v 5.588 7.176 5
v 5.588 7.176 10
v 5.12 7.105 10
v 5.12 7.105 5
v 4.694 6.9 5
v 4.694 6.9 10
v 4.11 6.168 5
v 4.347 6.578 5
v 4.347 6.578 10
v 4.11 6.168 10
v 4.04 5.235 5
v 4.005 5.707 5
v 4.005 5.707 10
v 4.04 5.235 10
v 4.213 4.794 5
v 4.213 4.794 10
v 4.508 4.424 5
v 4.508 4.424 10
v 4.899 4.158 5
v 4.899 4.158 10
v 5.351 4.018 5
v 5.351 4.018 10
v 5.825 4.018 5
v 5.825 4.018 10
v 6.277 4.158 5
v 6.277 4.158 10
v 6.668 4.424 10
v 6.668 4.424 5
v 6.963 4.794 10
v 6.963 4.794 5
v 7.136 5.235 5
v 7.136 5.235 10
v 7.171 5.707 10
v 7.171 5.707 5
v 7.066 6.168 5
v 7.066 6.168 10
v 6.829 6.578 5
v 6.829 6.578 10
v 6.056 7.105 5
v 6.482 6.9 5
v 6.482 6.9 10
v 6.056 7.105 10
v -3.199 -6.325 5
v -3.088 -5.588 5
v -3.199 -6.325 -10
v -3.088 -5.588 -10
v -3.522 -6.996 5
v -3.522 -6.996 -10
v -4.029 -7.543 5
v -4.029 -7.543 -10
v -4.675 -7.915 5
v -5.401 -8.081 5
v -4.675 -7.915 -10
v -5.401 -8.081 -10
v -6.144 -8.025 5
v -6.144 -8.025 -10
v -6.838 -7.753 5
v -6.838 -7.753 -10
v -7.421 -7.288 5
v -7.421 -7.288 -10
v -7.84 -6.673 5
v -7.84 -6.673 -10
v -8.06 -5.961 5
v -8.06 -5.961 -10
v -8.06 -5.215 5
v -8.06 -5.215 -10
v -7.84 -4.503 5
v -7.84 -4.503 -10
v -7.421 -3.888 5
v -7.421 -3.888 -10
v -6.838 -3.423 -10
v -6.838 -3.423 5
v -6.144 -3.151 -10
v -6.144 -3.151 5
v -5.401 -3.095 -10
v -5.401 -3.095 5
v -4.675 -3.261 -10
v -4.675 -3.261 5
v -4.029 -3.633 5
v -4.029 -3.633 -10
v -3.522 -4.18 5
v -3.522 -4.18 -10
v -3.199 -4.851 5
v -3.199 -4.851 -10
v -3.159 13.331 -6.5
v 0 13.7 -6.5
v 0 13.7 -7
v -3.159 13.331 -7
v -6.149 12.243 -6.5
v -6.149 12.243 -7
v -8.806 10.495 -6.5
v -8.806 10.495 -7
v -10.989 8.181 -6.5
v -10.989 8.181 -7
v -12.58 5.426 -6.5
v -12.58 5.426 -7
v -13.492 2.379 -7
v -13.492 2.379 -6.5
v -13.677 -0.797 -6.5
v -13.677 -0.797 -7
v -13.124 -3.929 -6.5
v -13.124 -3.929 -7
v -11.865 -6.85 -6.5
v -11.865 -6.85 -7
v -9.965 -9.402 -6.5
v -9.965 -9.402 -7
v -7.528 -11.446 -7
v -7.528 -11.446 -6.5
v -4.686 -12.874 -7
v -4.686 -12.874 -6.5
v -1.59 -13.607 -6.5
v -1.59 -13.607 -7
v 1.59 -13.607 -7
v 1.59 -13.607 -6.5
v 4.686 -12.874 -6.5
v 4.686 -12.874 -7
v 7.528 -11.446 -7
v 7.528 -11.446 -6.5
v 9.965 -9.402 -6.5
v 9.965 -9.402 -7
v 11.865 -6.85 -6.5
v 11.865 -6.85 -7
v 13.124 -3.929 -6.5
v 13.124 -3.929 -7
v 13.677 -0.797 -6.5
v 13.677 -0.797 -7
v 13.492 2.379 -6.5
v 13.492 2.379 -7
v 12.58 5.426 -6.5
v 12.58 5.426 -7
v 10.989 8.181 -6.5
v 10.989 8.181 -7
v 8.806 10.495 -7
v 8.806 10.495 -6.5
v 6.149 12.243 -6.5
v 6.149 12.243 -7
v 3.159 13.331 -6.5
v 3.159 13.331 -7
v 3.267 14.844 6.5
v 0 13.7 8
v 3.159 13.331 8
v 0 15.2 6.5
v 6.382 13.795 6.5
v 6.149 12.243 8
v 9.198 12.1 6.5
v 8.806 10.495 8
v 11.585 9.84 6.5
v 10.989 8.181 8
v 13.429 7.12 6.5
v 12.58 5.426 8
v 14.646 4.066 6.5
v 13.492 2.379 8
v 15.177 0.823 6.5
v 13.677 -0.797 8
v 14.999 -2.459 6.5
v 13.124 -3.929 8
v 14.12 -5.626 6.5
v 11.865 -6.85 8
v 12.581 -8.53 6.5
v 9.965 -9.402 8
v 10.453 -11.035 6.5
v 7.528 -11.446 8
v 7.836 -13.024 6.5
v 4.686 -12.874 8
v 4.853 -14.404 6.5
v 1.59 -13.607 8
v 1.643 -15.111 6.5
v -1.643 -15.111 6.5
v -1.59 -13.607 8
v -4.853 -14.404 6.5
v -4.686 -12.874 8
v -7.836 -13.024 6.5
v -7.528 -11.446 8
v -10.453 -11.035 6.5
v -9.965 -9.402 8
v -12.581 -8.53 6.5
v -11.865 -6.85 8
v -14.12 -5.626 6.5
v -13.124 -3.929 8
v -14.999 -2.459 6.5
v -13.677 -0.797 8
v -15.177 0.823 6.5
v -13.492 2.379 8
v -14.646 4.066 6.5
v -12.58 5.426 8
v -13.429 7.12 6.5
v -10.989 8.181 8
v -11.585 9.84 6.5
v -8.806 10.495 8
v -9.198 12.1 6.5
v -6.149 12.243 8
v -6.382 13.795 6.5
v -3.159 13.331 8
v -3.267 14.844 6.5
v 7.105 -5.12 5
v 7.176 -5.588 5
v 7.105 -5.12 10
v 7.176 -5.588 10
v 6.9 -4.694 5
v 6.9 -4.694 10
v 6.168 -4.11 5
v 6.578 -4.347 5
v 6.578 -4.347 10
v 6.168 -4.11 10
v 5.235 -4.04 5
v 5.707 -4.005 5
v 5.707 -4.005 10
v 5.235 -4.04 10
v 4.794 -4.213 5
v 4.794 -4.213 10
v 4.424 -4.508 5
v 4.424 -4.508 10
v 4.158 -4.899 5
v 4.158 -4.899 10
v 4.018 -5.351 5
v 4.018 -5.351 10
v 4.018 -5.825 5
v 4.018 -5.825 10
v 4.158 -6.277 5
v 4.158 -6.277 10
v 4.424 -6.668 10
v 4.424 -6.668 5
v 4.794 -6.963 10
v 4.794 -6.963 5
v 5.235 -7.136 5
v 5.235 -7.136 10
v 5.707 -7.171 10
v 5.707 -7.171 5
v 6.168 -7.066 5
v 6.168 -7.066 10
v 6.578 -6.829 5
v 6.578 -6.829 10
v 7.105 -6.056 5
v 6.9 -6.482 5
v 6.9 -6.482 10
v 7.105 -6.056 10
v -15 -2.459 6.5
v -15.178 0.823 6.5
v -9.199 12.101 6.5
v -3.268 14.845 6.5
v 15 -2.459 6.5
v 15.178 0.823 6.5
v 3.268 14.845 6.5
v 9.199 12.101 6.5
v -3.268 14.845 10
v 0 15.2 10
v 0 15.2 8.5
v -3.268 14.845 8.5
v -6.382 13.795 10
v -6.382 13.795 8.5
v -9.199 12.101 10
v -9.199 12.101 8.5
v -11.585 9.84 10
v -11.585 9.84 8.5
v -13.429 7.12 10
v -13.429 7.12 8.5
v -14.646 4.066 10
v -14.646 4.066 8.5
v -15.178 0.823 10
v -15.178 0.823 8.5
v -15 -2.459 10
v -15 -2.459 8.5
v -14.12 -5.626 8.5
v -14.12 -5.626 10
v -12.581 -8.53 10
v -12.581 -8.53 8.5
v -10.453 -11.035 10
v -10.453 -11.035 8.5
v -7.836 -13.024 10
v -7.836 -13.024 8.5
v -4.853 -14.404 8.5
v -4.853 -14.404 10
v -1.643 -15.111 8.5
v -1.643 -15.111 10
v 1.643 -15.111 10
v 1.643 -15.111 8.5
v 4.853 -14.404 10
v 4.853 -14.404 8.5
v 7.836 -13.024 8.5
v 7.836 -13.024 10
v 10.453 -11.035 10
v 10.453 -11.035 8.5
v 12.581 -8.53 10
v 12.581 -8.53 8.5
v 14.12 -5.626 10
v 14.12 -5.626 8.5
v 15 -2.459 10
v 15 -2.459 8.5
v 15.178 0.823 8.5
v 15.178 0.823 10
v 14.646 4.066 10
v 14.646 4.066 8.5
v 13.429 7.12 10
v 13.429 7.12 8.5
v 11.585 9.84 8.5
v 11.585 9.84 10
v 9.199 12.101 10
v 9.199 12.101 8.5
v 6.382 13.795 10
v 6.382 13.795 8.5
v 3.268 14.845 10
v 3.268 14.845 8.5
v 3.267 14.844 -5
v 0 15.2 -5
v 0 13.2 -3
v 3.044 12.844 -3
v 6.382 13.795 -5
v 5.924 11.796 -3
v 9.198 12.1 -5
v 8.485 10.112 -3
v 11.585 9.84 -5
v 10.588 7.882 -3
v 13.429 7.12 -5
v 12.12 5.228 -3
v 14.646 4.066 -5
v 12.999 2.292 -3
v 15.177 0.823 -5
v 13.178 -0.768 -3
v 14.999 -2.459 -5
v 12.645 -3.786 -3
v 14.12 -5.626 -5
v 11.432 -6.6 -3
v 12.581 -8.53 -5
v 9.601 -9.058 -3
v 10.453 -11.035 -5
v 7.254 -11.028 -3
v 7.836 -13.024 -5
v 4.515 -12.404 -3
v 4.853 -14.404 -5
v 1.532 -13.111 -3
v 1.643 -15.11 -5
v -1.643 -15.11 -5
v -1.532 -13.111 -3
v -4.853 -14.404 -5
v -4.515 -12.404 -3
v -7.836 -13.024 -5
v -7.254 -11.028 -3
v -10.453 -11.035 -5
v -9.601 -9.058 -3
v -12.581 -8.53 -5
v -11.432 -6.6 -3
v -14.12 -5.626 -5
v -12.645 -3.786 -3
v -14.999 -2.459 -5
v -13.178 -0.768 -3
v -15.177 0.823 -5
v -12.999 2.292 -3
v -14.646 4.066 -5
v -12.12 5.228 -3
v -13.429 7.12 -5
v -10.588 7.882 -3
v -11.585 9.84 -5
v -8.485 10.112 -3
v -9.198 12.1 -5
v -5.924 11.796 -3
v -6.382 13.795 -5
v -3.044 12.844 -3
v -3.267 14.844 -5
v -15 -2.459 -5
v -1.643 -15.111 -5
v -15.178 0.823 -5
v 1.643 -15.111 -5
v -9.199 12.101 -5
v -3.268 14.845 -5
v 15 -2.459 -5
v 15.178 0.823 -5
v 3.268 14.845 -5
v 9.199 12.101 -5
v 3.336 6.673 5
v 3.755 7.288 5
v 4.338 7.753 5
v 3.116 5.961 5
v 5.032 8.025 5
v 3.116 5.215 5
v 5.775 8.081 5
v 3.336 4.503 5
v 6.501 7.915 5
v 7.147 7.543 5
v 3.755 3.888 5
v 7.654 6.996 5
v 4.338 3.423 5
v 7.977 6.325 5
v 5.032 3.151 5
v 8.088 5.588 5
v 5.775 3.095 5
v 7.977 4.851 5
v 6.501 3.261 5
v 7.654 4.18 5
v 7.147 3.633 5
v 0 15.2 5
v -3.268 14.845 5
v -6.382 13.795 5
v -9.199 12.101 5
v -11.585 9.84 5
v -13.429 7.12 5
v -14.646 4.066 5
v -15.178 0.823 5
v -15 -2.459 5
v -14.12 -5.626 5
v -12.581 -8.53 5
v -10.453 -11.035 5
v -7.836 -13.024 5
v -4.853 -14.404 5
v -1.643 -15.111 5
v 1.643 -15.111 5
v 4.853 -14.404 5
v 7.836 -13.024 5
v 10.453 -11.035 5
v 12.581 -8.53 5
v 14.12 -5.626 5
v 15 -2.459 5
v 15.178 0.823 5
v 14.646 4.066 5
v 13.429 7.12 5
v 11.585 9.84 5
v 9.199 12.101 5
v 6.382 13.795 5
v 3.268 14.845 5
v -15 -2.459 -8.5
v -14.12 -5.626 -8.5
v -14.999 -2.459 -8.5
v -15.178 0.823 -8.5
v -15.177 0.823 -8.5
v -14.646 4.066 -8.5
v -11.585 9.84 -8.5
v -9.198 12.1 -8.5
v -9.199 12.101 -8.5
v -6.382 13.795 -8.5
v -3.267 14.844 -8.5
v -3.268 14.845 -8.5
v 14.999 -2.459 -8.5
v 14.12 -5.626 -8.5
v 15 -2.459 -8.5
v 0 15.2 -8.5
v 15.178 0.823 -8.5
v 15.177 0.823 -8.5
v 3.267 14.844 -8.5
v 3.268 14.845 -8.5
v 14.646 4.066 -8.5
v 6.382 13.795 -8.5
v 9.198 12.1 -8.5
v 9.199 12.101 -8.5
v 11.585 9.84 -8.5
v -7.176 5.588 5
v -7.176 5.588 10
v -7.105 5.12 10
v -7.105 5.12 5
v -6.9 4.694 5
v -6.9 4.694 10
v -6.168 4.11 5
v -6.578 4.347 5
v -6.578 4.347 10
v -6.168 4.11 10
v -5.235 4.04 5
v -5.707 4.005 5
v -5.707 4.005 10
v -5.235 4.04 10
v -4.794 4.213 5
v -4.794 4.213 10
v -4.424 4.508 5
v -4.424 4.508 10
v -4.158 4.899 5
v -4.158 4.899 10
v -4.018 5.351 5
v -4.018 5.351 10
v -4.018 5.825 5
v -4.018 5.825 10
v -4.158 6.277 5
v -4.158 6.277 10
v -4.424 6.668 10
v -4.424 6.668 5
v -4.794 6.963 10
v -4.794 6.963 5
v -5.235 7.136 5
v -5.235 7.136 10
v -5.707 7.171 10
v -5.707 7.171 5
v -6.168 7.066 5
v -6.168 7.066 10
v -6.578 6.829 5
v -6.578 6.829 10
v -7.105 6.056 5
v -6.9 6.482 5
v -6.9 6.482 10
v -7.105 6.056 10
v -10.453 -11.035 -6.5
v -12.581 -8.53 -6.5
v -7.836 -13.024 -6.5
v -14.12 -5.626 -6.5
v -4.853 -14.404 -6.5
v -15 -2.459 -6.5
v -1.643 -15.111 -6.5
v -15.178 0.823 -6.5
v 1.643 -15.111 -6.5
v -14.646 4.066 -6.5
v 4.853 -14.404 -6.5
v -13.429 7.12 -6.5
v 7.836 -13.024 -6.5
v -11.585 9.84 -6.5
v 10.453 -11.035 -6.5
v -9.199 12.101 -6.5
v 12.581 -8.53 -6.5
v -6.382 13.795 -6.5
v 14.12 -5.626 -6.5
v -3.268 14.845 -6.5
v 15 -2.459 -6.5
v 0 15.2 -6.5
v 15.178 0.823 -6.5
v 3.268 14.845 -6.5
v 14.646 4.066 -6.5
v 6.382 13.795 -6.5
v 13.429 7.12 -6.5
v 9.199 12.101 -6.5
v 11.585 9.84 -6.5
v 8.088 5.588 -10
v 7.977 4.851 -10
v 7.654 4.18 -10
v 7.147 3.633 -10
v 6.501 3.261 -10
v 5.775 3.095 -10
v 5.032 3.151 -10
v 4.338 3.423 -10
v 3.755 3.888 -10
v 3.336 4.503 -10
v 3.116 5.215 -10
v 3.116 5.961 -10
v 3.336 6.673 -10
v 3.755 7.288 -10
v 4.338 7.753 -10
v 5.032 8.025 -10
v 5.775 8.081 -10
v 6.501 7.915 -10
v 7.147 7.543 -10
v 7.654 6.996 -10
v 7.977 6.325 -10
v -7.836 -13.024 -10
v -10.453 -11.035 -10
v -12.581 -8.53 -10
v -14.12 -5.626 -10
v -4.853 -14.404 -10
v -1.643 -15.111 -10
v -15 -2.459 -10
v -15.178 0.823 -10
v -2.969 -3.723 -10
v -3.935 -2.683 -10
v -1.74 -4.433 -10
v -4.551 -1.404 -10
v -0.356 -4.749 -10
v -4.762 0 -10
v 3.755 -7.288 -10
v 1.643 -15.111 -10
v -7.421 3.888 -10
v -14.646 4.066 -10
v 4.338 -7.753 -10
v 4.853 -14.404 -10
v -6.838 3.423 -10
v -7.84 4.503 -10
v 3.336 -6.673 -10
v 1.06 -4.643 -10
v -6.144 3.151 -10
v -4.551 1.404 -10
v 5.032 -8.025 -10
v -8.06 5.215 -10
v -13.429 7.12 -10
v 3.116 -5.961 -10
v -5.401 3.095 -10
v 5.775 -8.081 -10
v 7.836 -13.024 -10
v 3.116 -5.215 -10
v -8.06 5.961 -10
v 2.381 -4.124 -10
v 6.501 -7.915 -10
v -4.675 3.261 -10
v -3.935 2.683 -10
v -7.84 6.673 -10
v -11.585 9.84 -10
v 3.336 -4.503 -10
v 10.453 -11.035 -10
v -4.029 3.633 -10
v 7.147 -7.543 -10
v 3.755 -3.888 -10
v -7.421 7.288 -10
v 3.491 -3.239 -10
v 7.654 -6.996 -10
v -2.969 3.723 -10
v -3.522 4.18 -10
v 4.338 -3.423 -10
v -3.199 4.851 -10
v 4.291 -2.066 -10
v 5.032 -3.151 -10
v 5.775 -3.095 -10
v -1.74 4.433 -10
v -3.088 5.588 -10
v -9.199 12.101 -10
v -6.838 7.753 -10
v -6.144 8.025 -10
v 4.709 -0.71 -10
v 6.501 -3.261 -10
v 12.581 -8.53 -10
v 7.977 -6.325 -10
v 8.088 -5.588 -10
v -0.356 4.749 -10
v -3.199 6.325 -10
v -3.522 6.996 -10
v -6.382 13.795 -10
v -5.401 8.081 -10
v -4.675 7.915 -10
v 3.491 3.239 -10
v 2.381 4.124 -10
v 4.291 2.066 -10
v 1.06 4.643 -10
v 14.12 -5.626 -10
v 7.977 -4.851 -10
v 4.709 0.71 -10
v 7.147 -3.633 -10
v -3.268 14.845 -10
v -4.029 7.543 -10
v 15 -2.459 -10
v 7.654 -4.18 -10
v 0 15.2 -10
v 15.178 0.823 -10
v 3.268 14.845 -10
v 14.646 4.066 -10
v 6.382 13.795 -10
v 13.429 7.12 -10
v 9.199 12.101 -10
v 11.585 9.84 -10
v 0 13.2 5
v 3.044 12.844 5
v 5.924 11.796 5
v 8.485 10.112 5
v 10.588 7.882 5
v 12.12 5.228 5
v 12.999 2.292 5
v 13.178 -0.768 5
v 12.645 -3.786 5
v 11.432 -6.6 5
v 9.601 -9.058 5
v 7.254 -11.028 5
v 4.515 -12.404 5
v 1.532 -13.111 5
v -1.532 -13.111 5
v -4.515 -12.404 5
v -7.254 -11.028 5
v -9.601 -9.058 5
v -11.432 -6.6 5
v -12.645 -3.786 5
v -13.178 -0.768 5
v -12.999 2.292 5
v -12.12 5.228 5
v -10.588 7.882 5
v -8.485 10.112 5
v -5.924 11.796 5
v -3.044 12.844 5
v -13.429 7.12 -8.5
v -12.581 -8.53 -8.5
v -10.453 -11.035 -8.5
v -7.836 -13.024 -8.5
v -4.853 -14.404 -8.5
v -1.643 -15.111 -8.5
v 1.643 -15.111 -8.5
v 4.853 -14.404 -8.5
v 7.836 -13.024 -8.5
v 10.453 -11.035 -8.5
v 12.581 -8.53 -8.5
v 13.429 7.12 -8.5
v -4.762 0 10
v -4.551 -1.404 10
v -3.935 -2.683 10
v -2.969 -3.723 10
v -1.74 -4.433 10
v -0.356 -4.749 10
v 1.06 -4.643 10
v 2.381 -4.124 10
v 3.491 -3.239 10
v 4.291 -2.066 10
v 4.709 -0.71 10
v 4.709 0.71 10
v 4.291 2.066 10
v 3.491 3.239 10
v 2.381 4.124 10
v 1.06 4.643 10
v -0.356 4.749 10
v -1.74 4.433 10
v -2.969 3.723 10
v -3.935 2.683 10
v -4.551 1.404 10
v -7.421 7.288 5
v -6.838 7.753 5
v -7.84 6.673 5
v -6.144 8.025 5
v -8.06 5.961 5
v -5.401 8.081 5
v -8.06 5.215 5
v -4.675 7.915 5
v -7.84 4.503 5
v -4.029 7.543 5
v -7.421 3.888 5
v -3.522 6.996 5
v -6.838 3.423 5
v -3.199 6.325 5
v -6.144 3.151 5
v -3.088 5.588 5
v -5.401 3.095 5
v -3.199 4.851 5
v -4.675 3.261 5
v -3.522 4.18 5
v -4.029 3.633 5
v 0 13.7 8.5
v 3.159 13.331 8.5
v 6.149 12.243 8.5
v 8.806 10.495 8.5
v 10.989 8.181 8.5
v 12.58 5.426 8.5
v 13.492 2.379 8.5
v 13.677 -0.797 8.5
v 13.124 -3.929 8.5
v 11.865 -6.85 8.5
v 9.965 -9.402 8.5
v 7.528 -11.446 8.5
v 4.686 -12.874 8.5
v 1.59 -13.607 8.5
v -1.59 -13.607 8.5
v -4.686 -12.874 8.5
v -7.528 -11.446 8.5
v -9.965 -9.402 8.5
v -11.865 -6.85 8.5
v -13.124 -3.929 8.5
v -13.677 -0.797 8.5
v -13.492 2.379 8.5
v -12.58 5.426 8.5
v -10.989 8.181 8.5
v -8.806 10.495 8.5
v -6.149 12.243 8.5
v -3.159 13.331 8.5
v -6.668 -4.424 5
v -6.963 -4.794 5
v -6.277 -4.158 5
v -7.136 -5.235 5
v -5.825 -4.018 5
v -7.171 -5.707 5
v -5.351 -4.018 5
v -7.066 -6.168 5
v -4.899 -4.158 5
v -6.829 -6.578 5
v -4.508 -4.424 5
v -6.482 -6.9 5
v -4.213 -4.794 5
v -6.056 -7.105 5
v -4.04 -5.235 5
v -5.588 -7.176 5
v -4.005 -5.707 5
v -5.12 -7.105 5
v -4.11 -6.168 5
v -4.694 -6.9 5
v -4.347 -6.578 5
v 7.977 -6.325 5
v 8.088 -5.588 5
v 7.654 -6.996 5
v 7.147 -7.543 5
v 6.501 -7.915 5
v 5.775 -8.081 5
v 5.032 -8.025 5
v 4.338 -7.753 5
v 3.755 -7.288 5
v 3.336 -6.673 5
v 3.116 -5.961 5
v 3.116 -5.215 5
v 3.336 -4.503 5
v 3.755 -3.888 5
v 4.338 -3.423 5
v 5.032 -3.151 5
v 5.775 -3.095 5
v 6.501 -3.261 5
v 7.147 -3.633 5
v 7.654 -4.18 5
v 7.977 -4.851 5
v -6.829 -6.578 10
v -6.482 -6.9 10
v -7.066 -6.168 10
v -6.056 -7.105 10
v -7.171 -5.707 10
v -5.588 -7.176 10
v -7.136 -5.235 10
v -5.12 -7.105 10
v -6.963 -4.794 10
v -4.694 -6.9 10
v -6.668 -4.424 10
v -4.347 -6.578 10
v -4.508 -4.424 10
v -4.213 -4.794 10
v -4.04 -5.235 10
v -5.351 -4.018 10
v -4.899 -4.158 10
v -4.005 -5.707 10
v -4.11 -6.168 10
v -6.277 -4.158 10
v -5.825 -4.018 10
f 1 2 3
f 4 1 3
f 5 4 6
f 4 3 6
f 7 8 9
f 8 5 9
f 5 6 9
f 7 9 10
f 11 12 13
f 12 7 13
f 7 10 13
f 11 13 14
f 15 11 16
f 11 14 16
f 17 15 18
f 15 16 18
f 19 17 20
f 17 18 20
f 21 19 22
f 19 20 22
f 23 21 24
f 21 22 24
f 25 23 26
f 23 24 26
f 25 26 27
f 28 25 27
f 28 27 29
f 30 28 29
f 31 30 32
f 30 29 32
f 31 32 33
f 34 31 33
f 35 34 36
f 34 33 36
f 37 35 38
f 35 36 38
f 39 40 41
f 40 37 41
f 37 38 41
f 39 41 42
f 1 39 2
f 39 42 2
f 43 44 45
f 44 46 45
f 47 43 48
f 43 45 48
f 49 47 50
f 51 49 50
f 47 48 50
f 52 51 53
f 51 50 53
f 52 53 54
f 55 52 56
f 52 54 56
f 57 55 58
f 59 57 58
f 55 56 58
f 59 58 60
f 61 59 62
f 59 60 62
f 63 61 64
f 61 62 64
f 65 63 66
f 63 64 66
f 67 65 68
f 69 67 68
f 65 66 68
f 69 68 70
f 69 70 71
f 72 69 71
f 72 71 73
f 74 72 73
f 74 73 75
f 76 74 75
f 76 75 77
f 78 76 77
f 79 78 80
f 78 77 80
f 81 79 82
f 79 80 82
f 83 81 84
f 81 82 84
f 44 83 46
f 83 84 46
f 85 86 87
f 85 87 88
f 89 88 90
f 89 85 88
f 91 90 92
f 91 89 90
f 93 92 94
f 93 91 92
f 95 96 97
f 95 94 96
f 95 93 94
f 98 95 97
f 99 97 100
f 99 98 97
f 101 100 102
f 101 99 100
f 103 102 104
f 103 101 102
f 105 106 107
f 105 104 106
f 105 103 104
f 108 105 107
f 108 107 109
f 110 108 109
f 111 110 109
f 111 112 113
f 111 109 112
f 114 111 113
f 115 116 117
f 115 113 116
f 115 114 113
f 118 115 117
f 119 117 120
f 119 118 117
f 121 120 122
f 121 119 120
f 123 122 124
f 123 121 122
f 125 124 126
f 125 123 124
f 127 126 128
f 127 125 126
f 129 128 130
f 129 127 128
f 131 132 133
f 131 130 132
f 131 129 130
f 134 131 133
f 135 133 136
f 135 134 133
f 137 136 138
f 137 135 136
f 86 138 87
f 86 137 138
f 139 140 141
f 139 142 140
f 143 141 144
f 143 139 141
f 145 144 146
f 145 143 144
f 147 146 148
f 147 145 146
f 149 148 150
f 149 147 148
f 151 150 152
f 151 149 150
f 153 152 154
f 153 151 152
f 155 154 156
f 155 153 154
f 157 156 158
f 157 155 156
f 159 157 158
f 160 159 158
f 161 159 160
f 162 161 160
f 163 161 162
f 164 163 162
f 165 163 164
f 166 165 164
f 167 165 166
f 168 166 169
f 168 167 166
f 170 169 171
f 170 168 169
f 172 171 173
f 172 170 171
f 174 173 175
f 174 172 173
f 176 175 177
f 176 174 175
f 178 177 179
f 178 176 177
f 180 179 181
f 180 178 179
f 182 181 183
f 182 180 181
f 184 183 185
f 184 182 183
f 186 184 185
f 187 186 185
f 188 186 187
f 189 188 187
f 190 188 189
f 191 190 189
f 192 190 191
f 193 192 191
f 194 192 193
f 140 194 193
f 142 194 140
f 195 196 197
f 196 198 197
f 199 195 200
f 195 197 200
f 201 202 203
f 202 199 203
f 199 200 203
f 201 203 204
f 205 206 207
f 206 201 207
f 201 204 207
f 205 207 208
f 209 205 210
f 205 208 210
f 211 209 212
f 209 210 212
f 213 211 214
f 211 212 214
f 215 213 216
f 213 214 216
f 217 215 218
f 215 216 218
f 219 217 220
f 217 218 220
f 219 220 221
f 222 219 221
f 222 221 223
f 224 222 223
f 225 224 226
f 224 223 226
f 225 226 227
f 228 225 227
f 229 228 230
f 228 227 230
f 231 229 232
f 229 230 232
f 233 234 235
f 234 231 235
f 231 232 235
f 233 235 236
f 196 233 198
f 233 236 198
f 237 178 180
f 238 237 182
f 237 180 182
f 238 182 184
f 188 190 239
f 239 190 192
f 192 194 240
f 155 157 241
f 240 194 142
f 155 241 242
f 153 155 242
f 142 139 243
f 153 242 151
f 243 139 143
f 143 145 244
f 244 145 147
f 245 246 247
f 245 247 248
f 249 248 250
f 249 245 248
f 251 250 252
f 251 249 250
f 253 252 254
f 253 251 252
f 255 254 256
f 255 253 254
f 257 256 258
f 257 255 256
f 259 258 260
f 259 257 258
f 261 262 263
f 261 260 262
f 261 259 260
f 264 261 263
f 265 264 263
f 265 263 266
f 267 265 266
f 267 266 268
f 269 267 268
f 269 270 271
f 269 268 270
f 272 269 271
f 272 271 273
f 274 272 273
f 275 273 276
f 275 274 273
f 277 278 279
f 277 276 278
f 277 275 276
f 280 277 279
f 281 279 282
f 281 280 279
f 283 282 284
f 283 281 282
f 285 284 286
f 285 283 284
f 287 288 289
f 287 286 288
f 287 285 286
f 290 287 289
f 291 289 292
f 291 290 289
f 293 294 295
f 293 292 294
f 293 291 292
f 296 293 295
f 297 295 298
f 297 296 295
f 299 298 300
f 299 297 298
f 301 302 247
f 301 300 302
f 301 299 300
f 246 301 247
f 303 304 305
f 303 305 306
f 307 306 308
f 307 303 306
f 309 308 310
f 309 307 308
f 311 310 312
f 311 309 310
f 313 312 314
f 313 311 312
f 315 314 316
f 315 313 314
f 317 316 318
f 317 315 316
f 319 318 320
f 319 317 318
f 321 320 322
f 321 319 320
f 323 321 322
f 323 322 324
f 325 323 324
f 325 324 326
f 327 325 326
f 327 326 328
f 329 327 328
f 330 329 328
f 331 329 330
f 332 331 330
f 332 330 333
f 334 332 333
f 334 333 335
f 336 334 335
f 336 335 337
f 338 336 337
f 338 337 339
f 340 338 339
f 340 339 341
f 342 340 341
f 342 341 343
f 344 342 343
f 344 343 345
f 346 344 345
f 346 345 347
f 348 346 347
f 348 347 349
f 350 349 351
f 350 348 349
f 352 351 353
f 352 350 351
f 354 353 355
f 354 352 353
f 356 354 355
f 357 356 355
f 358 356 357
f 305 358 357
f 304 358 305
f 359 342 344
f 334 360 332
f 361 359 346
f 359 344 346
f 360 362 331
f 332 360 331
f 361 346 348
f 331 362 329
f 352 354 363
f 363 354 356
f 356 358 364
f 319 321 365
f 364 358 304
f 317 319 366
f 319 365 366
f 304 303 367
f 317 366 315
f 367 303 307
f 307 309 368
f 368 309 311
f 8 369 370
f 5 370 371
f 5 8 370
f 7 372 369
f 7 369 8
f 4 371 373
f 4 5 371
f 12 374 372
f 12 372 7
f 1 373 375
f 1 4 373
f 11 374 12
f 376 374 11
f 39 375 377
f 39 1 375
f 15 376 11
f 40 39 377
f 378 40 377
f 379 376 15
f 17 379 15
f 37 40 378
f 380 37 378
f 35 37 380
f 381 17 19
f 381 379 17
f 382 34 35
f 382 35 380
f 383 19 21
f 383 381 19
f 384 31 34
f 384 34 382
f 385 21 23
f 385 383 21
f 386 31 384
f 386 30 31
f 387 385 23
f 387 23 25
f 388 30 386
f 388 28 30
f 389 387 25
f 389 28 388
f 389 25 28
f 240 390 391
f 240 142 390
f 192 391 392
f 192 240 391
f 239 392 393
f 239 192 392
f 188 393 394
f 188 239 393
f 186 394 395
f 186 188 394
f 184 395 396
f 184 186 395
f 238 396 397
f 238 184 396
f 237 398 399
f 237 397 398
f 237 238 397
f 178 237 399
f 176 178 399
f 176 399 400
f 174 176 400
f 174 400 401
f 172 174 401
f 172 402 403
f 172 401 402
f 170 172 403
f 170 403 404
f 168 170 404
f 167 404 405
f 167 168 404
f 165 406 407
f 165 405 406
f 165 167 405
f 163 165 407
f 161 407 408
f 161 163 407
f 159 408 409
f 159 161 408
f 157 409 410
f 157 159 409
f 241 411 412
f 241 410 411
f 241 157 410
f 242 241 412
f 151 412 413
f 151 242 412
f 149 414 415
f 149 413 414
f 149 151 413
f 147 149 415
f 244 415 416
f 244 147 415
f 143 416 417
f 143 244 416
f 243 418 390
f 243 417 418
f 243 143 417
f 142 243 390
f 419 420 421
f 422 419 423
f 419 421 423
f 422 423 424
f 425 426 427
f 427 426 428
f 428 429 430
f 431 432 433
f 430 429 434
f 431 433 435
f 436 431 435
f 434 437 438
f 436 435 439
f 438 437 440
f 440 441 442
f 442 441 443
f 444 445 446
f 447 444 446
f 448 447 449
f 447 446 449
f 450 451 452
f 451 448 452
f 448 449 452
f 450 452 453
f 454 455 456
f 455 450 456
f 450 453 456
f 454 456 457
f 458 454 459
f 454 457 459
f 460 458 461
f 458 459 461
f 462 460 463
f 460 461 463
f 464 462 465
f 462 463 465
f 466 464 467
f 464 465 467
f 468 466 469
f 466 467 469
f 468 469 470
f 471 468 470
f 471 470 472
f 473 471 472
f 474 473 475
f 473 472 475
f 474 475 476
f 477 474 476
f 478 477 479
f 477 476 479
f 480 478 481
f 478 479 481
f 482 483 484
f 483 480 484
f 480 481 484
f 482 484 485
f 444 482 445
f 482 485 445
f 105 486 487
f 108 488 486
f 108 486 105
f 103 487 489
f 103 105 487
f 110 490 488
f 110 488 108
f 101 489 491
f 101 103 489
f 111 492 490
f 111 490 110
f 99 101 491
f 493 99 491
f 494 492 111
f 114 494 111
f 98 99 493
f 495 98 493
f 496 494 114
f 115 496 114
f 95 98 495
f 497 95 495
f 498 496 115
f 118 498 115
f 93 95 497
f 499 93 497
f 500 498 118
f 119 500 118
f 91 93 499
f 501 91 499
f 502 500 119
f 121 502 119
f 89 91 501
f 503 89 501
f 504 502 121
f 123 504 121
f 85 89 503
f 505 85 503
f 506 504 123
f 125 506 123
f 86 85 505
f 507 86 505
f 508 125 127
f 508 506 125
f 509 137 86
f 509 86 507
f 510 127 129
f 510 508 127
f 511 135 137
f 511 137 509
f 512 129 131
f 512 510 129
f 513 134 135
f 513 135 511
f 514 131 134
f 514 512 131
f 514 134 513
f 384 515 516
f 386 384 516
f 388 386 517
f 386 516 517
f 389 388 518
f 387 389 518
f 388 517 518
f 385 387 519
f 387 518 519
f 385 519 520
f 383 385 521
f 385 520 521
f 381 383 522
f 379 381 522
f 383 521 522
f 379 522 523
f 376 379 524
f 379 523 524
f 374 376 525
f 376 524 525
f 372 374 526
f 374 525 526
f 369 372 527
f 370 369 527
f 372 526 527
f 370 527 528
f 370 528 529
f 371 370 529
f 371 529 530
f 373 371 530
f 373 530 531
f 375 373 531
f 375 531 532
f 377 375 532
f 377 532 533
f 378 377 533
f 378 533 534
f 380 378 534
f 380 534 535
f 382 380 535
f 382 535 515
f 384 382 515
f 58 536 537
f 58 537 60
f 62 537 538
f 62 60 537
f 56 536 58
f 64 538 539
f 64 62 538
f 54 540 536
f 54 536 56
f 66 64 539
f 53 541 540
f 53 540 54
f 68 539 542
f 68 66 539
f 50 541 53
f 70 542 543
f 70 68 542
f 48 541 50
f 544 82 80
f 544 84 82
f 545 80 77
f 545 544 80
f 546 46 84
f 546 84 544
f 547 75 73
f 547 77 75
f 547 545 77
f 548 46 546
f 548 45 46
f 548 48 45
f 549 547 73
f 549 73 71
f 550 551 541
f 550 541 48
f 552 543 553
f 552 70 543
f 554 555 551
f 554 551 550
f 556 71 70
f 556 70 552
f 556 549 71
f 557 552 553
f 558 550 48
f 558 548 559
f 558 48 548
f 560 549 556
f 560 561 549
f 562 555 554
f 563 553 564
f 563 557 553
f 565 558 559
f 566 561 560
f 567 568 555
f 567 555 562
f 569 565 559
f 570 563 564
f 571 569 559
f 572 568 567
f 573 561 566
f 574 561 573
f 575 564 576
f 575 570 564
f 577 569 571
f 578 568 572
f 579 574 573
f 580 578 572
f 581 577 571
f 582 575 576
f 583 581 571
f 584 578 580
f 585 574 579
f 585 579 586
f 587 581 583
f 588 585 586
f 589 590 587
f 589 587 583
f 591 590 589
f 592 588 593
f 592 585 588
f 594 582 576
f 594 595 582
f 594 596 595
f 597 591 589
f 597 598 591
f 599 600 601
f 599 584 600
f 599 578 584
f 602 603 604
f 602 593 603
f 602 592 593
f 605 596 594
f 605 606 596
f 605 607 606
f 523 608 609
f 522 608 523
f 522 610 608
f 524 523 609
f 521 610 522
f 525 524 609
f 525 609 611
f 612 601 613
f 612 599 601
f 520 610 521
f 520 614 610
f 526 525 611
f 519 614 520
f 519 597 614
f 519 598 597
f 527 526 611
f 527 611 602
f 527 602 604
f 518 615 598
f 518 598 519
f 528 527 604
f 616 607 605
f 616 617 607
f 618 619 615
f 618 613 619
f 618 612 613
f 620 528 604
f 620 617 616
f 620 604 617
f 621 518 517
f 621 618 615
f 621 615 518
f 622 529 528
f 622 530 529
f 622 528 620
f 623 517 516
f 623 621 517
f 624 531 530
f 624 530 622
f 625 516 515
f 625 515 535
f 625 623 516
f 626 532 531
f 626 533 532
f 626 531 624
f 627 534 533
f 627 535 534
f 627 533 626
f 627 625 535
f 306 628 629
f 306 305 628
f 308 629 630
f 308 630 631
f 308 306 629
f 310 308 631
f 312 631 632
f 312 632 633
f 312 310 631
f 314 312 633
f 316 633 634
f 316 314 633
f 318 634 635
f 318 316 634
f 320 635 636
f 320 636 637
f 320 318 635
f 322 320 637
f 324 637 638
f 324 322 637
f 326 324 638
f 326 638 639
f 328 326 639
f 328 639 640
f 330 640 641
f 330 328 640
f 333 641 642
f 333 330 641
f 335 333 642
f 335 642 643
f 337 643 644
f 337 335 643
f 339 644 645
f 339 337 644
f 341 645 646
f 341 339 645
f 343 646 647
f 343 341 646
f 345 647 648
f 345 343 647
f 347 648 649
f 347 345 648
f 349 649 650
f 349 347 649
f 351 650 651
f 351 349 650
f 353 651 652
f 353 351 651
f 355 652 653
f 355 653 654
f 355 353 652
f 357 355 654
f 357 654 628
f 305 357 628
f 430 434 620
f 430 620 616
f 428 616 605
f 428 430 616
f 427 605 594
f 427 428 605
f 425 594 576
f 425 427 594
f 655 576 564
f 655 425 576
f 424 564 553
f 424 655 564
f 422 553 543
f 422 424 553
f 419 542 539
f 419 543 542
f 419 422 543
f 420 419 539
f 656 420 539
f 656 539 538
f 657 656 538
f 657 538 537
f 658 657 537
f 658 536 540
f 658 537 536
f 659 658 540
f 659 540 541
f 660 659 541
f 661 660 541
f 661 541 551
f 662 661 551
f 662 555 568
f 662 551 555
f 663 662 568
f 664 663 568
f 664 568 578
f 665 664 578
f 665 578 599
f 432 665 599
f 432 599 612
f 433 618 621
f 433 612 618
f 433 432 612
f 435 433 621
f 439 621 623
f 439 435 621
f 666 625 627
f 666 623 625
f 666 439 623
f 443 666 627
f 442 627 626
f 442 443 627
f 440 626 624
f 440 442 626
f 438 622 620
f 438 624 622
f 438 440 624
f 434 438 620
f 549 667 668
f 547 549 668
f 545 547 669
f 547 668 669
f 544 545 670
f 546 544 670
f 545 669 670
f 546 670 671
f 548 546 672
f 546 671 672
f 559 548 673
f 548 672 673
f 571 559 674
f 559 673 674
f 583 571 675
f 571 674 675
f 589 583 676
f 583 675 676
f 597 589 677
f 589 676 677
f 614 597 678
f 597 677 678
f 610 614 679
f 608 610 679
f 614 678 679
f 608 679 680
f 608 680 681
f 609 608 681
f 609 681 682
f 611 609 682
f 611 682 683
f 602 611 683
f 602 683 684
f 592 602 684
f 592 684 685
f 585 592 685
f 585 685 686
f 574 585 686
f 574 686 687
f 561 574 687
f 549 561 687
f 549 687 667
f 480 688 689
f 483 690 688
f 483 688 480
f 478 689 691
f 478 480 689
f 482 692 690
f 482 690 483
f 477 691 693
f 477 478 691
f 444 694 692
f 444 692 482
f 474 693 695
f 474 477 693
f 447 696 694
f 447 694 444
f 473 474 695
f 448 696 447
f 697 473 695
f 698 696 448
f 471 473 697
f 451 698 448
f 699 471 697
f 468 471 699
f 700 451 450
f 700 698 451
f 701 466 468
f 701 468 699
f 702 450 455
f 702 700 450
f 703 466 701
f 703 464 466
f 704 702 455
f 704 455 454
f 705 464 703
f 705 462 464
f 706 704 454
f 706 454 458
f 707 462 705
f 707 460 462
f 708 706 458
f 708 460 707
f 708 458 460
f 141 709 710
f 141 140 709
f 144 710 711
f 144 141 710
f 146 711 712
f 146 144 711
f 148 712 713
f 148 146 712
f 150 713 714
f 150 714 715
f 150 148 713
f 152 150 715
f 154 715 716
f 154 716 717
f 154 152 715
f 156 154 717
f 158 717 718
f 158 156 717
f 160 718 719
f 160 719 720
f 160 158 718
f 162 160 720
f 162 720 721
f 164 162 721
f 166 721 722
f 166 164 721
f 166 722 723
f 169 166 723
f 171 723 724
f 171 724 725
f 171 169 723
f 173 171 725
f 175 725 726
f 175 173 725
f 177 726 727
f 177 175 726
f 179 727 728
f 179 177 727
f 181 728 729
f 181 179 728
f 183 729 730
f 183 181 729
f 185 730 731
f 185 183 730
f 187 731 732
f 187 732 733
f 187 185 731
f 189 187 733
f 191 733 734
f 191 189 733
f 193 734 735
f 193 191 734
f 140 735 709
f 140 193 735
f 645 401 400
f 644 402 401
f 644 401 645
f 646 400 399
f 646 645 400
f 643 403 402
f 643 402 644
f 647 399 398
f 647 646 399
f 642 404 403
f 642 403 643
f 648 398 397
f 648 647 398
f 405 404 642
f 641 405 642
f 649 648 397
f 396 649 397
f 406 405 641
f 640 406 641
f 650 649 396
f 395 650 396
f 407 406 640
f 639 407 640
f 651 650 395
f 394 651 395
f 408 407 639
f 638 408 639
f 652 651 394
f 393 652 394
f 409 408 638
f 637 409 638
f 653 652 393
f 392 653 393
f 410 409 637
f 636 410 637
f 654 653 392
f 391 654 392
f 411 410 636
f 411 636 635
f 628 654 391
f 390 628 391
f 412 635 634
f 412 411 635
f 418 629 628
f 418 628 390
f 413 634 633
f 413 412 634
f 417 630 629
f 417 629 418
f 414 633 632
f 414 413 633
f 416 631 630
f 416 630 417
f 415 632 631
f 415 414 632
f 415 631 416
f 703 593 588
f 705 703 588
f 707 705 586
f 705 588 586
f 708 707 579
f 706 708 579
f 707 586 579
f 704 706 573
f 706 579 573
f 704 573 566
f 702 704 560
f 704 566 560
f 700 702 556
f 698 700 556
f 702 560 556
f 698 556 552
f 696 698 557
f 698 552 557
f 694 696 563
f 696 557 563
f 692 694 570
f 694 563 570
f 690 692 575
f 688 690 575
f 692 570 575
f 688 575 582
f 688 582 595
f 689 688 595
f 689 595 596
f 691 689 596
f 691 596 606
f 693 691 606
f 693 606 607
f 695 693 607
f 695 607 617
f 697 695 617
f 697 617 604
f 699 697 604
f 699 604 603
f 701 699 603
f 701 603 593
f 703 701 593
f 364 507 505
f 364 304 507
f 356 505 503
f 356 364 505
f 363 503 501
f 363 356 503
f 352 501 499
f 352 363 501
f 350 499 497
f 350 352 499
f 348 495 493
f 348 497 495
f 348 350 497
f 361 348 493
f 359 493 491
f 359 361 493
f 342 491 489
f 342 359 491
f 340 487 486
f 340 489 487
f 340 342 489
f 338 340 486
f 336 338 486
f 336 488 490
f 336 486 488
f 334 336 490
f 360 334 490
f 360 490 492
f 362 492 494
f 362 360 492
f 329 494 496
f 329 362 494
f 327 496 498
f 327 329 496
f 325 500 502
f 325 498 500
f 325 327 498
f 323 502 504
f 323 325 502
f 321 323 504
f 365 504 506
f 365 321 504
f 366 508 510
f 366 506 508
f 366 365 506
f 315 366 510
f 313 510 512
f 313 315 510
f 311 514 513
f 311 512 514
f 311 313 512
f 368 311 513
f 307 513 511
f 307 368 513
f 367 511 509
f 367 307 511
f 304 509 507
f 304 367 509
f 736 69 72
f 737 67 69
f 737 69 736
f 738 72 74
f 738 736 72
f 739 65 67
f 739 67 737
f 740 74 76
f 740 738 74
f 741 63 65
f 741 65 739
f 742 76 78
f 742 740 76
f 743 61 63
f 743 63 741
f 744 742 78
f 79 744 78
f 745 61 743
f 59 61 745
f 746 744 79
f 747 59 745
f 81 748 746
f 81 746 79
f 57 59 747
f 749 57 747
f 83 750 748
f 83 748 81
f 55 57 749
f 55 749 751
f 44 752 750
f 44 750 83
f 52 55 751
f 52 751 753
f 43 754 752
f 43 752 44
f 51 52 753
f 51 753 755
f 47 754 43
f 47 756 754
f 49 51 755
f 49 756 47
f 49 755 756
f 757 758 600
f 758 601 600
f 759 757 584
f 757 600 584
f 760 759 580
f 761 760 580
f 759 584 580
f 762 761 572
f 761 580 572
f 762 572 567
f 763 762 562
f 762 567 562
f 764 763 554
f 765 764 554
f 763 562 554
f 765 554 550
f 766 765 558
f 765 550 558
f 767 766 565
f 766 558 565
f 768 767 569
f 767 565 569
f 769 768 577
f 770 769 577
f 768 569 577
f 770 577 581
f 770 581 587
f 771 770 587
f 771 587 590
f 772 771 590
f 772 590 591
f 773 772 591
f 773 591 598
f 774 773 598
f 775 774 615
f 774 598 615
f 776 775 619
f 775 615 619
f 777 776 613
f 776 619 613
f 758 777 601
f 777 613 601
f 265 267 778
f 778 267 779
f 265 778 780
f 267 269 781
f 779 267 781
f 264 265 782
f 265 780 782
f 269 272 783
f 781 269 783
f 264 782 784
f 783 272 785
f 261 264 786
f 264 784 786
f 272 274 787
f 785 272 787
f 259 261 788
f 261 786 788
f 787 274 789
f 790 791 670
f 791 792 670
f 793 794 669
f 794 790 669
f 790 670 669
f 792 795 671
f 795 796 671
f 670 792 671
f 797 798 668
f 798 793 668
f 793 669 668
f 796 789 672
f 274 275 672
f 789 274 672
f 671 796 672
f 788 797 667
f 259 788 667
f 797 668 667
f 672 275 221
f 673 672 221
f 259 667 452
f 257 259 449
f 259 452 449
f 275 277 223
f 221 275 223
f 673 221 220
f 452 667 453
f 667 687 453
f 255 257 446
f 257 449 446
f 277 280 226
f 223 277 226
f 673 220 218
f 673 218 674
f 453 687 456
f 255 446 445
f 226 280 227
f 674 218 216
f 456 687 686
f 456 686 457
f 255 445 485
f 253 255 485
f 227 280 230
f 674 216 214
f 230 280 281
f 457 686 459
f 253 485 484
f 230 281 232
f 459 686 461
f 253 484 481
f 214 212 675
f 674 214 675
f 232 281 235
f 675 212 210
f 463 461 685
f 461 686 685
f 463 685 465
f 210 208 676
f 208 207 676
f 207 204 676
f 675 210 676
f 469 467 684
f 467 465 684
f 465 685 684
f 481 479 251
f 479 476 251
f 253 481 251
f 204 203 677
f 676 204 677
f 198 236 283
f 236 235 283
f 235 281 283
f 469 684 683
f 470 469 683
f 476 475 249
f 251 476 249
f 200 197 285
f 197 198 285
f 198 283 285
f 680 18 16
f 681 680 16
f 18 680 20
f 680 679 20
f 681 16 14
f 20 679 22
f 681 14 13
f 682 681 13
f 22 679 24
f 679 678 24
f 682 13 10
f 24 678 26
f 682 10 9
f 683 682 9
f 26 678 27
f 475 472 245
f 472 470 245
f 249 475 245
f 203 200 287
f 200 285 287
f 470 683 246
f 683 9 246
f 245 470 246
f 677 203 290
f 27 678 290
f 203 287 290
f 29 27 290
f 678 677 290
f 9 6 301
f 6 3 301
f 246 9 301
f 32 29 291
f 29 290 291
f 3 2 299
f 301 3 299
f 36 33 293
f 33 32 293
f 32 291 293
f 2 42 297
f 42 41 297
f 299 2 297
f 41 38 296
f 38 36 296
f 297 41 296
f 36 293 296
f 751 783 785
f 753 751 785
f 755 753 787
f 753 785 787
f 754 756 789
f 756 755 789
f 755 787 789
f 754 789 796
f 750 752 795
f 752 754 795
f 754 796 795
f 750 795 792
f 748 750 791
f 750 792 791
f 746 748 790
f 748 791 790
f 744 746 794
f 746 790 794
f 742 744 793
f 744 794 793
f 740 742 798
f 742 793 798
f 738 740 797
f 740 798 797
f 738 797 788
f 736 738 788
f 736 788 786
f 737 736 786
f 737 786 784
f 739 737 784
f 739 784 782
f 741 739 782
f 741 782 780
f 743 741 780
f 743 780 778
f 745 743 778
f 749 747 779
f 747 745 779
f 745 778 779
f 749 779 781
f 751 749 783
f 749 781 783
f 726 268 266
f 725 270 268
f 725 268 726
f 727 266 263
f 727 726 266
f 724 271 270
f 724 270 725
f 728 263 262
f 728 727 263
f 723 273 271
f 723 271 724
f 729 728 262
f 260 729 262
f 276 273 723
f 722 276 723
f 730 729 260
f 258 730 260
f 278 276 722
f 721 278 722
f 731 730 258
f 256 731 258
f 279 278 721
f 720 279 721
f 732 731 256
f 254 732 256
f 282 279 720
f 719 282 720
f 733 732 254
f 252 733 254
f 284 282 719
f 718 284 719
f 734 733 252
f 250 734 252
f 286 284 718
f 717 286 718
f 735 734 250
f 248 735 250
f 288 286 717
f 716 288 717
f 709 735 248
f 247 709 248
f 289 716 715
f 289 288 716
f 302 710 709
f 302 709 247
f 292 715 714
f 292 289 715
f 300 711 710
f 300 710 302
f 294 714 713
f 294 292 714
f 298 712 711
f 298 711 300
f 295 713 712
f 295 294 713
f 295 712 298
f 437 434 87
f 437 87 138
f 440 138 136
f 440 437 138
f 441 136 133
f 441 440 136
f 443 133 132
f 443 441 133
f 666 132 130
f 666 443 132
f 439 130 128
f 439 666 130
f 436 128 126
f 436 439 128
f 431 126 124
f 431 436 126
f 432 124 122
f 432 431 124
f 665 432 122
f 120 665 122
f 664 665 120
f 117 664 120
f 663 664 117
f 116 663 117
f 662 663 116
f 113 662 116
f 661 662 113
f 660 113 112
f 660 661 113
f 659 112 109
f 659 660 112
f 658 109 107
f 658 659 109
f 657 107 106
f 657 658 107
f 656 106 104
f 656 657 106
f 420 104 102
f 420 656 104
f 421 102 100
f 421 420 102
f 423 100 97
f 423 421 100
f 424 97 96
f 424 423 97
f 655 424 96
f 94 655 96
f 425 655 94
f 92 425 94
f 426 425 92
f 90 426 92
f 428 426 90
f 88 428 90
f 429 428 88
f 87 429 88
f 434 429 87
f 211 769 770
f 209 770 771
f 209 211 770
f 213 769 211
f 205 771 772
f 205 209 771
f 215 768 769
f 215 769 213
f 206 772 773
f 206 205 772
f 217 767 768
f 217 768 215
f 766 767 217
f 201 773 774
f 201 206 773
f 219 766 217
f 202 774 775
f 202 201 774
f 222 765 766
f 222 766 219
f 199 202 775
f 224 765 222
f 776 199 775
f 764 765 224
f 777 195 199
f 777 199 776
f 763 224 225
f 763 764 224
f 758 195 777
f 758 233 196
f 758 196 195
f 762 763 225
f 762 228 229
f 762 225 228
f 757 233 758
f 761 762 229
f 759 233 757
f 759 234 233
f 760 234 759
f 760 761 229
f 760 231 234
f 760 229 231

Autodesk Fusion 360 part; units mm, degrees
sketch "Sketch1" plane through (0, 0, 0) normal (1, 0, 0) x (0, 1, 0)
  line L0 (15.2, 10) -> (-15.2, 10)
  line L1 (-15.2, 10) -> (-15.2, -10)
  line L2 (-15.2, -10) -> (15.2, -10)
  line L3 (15.2, -10) -> (15.2, 10)
  line L4 (15.2, 10) -> (-15.2, -10) construction
  line L5 (-15.2, 10) -> (15.2, -10) construction
  line L6 (0, 10) -> (0, -10)
  line L7 (15.2, 10) -> (15.2, 8.5)
  line L8 (15.2, 8.5) -> (13.7, 8.5)
  line L9 (13.7, 8.5) -> (13.7, 6.5)
  line L10 (13.7, 6.5) -> (15.2, 6.5)
  line L11 (15.2, -10) -> (15.2, -8.5)
  line L12 (15.2, -8.5) -> (13.7, -8.5)
  line L13 (13.7, -8.5) -> (13.7, -6.5)
  line L14 (13.7, -6.5) -> (15.2, -6.5)
  line L15 (15.2, -6.5) -> (15.2, -5)
  line L16 (15.2, -5) -> (13.2, -5)
  line L17 (15.2, 6.5) -> (15.2, 5)
  line L18 (15.2, 5) -> (13.2, 5)
  line L19 (13.2, 5) -> (13.2, -5)
  dimension "d1" = 30.4
  dimension "d2" = 20
  dimension "d3" = 1.5
  dimension "d4" = 1.5
  dimension "d5" = 2
  dimension "d6" = 1.5
  dimension "d7" = 1.5
  dimension "d8" = 2
  dimension "d9" = 1.5
  dimension "d10" = 2
  dimension "d11" = 2
revolve "Revolve1" add sketch "Sketch1" angle 360 about axis through (0, 0, 10) along (0, 0, -1) contours L0 L2 L3 L6 L7 L8 L9 L10 L11 L12 L13 L14 L15 L16 L17 L18 L19
sketch "Sketch2" plane through (0, 0, 10) normal (0, 0, 1) x (-1, 0, 0)
  circle A0 centre (0, 0) radius 15.2
  line L0 (5.588, -5.588) -> (-5.588, -5.588)
  line L1 (-5.588, -5.588) -> (-5.588, 5.588)
  line L2 (-5.588, 5.588) -> (5.588, 5.588)
  line L3 (5.588, 5.588) -> (5.588, -5.588)
  line L4 (5.588, -5.588) -> (-5.588, 5.588) construction
  line L5 (-5.588, -5.588) -> (5.588, 5.588) construction
  circle A1 centre (5.588, -5.588) radius 1.5875
  dimension "d13" = 11.176
  dimension "d14" = 11.176
  dimension "d15" = 3.175
extrude "Extrude1" cut sketch "Sketch2" against normal blind 25 contours L0 L3 A1 | L0 L3 A1
pattern_circular "C-Pattern1" count 4 over 360 about axis through (0, 0, 1.75) along (0, 0, 1) of "Extrude1"
chamfer "Chamfer1" distance 1.5 angle 45 1 edges at (-12.7729, 4.9541, -8.5)
chamfer "Chamfer2" distance 2 angle 45 1 edges at (-12.3067, 4.7733, -5)
chamfer "Chamfer3" distance 1.5 angle 45 1 edges at (-12.7729, 4.9541, 6.5)
sketch "Sketch3" plane through (0, 0, -10) normal (0, 0, -1) x (1, 0, 0)
  circle A0 centre (5.588, -5.588) radius 1.5875
  circle A1 centre (5.588, 5.588) radius 1.5875
  circle A2 centre (-5.588, 5.588) radius 1.5875
  circle A3 centre (-5.588, -5.588) radius 1.5875
  circle A4 centre (0, 0) radius 15.2
  circle A5 centre (-5.588, 5.588) radius 2.5
  circle A6 centre (-5.588, -5.588) radius 2.5
  circle A7 centre (5.588, -5.588) radius 2.5
  circle A8 centre (5.588, 5.588) radius 2.5
  dimension "d23" = 5
  dimension "d24" = 5
  dimension "d25" = 5
  dimension "d26" = 5
extrude "Extrude2" cut sketch "Sketch3" against normal blind 15 contours A5 | A6 | A7 | A8
sketch "Sketch4" plane through (0, 0, 10) normal (0, 0, 1) x (-1, 0, 0)
  circle A0 centre (-5.588, -5.588) radius 1.5875
  circle A1 centre (-5.588, 5.588) radius 1.5875
  circle A2 centre (5.588, 5.588) radius 1.5875
  circle A3 centre (5.588, -5.588) radius 1.5875
  circle A4 centre (0, 0) radius 15.2
  circle A5 centre (0, 0) radius 4.7625
  dimension "d29" = 9.525
extrude "Extrude3" cut sketch "Sketch4" against normal blind 26 contours A5
equation "d13 = 0.315 in + 0.125 in"
equation "d14 = 0.315 in + 0.125 in"
